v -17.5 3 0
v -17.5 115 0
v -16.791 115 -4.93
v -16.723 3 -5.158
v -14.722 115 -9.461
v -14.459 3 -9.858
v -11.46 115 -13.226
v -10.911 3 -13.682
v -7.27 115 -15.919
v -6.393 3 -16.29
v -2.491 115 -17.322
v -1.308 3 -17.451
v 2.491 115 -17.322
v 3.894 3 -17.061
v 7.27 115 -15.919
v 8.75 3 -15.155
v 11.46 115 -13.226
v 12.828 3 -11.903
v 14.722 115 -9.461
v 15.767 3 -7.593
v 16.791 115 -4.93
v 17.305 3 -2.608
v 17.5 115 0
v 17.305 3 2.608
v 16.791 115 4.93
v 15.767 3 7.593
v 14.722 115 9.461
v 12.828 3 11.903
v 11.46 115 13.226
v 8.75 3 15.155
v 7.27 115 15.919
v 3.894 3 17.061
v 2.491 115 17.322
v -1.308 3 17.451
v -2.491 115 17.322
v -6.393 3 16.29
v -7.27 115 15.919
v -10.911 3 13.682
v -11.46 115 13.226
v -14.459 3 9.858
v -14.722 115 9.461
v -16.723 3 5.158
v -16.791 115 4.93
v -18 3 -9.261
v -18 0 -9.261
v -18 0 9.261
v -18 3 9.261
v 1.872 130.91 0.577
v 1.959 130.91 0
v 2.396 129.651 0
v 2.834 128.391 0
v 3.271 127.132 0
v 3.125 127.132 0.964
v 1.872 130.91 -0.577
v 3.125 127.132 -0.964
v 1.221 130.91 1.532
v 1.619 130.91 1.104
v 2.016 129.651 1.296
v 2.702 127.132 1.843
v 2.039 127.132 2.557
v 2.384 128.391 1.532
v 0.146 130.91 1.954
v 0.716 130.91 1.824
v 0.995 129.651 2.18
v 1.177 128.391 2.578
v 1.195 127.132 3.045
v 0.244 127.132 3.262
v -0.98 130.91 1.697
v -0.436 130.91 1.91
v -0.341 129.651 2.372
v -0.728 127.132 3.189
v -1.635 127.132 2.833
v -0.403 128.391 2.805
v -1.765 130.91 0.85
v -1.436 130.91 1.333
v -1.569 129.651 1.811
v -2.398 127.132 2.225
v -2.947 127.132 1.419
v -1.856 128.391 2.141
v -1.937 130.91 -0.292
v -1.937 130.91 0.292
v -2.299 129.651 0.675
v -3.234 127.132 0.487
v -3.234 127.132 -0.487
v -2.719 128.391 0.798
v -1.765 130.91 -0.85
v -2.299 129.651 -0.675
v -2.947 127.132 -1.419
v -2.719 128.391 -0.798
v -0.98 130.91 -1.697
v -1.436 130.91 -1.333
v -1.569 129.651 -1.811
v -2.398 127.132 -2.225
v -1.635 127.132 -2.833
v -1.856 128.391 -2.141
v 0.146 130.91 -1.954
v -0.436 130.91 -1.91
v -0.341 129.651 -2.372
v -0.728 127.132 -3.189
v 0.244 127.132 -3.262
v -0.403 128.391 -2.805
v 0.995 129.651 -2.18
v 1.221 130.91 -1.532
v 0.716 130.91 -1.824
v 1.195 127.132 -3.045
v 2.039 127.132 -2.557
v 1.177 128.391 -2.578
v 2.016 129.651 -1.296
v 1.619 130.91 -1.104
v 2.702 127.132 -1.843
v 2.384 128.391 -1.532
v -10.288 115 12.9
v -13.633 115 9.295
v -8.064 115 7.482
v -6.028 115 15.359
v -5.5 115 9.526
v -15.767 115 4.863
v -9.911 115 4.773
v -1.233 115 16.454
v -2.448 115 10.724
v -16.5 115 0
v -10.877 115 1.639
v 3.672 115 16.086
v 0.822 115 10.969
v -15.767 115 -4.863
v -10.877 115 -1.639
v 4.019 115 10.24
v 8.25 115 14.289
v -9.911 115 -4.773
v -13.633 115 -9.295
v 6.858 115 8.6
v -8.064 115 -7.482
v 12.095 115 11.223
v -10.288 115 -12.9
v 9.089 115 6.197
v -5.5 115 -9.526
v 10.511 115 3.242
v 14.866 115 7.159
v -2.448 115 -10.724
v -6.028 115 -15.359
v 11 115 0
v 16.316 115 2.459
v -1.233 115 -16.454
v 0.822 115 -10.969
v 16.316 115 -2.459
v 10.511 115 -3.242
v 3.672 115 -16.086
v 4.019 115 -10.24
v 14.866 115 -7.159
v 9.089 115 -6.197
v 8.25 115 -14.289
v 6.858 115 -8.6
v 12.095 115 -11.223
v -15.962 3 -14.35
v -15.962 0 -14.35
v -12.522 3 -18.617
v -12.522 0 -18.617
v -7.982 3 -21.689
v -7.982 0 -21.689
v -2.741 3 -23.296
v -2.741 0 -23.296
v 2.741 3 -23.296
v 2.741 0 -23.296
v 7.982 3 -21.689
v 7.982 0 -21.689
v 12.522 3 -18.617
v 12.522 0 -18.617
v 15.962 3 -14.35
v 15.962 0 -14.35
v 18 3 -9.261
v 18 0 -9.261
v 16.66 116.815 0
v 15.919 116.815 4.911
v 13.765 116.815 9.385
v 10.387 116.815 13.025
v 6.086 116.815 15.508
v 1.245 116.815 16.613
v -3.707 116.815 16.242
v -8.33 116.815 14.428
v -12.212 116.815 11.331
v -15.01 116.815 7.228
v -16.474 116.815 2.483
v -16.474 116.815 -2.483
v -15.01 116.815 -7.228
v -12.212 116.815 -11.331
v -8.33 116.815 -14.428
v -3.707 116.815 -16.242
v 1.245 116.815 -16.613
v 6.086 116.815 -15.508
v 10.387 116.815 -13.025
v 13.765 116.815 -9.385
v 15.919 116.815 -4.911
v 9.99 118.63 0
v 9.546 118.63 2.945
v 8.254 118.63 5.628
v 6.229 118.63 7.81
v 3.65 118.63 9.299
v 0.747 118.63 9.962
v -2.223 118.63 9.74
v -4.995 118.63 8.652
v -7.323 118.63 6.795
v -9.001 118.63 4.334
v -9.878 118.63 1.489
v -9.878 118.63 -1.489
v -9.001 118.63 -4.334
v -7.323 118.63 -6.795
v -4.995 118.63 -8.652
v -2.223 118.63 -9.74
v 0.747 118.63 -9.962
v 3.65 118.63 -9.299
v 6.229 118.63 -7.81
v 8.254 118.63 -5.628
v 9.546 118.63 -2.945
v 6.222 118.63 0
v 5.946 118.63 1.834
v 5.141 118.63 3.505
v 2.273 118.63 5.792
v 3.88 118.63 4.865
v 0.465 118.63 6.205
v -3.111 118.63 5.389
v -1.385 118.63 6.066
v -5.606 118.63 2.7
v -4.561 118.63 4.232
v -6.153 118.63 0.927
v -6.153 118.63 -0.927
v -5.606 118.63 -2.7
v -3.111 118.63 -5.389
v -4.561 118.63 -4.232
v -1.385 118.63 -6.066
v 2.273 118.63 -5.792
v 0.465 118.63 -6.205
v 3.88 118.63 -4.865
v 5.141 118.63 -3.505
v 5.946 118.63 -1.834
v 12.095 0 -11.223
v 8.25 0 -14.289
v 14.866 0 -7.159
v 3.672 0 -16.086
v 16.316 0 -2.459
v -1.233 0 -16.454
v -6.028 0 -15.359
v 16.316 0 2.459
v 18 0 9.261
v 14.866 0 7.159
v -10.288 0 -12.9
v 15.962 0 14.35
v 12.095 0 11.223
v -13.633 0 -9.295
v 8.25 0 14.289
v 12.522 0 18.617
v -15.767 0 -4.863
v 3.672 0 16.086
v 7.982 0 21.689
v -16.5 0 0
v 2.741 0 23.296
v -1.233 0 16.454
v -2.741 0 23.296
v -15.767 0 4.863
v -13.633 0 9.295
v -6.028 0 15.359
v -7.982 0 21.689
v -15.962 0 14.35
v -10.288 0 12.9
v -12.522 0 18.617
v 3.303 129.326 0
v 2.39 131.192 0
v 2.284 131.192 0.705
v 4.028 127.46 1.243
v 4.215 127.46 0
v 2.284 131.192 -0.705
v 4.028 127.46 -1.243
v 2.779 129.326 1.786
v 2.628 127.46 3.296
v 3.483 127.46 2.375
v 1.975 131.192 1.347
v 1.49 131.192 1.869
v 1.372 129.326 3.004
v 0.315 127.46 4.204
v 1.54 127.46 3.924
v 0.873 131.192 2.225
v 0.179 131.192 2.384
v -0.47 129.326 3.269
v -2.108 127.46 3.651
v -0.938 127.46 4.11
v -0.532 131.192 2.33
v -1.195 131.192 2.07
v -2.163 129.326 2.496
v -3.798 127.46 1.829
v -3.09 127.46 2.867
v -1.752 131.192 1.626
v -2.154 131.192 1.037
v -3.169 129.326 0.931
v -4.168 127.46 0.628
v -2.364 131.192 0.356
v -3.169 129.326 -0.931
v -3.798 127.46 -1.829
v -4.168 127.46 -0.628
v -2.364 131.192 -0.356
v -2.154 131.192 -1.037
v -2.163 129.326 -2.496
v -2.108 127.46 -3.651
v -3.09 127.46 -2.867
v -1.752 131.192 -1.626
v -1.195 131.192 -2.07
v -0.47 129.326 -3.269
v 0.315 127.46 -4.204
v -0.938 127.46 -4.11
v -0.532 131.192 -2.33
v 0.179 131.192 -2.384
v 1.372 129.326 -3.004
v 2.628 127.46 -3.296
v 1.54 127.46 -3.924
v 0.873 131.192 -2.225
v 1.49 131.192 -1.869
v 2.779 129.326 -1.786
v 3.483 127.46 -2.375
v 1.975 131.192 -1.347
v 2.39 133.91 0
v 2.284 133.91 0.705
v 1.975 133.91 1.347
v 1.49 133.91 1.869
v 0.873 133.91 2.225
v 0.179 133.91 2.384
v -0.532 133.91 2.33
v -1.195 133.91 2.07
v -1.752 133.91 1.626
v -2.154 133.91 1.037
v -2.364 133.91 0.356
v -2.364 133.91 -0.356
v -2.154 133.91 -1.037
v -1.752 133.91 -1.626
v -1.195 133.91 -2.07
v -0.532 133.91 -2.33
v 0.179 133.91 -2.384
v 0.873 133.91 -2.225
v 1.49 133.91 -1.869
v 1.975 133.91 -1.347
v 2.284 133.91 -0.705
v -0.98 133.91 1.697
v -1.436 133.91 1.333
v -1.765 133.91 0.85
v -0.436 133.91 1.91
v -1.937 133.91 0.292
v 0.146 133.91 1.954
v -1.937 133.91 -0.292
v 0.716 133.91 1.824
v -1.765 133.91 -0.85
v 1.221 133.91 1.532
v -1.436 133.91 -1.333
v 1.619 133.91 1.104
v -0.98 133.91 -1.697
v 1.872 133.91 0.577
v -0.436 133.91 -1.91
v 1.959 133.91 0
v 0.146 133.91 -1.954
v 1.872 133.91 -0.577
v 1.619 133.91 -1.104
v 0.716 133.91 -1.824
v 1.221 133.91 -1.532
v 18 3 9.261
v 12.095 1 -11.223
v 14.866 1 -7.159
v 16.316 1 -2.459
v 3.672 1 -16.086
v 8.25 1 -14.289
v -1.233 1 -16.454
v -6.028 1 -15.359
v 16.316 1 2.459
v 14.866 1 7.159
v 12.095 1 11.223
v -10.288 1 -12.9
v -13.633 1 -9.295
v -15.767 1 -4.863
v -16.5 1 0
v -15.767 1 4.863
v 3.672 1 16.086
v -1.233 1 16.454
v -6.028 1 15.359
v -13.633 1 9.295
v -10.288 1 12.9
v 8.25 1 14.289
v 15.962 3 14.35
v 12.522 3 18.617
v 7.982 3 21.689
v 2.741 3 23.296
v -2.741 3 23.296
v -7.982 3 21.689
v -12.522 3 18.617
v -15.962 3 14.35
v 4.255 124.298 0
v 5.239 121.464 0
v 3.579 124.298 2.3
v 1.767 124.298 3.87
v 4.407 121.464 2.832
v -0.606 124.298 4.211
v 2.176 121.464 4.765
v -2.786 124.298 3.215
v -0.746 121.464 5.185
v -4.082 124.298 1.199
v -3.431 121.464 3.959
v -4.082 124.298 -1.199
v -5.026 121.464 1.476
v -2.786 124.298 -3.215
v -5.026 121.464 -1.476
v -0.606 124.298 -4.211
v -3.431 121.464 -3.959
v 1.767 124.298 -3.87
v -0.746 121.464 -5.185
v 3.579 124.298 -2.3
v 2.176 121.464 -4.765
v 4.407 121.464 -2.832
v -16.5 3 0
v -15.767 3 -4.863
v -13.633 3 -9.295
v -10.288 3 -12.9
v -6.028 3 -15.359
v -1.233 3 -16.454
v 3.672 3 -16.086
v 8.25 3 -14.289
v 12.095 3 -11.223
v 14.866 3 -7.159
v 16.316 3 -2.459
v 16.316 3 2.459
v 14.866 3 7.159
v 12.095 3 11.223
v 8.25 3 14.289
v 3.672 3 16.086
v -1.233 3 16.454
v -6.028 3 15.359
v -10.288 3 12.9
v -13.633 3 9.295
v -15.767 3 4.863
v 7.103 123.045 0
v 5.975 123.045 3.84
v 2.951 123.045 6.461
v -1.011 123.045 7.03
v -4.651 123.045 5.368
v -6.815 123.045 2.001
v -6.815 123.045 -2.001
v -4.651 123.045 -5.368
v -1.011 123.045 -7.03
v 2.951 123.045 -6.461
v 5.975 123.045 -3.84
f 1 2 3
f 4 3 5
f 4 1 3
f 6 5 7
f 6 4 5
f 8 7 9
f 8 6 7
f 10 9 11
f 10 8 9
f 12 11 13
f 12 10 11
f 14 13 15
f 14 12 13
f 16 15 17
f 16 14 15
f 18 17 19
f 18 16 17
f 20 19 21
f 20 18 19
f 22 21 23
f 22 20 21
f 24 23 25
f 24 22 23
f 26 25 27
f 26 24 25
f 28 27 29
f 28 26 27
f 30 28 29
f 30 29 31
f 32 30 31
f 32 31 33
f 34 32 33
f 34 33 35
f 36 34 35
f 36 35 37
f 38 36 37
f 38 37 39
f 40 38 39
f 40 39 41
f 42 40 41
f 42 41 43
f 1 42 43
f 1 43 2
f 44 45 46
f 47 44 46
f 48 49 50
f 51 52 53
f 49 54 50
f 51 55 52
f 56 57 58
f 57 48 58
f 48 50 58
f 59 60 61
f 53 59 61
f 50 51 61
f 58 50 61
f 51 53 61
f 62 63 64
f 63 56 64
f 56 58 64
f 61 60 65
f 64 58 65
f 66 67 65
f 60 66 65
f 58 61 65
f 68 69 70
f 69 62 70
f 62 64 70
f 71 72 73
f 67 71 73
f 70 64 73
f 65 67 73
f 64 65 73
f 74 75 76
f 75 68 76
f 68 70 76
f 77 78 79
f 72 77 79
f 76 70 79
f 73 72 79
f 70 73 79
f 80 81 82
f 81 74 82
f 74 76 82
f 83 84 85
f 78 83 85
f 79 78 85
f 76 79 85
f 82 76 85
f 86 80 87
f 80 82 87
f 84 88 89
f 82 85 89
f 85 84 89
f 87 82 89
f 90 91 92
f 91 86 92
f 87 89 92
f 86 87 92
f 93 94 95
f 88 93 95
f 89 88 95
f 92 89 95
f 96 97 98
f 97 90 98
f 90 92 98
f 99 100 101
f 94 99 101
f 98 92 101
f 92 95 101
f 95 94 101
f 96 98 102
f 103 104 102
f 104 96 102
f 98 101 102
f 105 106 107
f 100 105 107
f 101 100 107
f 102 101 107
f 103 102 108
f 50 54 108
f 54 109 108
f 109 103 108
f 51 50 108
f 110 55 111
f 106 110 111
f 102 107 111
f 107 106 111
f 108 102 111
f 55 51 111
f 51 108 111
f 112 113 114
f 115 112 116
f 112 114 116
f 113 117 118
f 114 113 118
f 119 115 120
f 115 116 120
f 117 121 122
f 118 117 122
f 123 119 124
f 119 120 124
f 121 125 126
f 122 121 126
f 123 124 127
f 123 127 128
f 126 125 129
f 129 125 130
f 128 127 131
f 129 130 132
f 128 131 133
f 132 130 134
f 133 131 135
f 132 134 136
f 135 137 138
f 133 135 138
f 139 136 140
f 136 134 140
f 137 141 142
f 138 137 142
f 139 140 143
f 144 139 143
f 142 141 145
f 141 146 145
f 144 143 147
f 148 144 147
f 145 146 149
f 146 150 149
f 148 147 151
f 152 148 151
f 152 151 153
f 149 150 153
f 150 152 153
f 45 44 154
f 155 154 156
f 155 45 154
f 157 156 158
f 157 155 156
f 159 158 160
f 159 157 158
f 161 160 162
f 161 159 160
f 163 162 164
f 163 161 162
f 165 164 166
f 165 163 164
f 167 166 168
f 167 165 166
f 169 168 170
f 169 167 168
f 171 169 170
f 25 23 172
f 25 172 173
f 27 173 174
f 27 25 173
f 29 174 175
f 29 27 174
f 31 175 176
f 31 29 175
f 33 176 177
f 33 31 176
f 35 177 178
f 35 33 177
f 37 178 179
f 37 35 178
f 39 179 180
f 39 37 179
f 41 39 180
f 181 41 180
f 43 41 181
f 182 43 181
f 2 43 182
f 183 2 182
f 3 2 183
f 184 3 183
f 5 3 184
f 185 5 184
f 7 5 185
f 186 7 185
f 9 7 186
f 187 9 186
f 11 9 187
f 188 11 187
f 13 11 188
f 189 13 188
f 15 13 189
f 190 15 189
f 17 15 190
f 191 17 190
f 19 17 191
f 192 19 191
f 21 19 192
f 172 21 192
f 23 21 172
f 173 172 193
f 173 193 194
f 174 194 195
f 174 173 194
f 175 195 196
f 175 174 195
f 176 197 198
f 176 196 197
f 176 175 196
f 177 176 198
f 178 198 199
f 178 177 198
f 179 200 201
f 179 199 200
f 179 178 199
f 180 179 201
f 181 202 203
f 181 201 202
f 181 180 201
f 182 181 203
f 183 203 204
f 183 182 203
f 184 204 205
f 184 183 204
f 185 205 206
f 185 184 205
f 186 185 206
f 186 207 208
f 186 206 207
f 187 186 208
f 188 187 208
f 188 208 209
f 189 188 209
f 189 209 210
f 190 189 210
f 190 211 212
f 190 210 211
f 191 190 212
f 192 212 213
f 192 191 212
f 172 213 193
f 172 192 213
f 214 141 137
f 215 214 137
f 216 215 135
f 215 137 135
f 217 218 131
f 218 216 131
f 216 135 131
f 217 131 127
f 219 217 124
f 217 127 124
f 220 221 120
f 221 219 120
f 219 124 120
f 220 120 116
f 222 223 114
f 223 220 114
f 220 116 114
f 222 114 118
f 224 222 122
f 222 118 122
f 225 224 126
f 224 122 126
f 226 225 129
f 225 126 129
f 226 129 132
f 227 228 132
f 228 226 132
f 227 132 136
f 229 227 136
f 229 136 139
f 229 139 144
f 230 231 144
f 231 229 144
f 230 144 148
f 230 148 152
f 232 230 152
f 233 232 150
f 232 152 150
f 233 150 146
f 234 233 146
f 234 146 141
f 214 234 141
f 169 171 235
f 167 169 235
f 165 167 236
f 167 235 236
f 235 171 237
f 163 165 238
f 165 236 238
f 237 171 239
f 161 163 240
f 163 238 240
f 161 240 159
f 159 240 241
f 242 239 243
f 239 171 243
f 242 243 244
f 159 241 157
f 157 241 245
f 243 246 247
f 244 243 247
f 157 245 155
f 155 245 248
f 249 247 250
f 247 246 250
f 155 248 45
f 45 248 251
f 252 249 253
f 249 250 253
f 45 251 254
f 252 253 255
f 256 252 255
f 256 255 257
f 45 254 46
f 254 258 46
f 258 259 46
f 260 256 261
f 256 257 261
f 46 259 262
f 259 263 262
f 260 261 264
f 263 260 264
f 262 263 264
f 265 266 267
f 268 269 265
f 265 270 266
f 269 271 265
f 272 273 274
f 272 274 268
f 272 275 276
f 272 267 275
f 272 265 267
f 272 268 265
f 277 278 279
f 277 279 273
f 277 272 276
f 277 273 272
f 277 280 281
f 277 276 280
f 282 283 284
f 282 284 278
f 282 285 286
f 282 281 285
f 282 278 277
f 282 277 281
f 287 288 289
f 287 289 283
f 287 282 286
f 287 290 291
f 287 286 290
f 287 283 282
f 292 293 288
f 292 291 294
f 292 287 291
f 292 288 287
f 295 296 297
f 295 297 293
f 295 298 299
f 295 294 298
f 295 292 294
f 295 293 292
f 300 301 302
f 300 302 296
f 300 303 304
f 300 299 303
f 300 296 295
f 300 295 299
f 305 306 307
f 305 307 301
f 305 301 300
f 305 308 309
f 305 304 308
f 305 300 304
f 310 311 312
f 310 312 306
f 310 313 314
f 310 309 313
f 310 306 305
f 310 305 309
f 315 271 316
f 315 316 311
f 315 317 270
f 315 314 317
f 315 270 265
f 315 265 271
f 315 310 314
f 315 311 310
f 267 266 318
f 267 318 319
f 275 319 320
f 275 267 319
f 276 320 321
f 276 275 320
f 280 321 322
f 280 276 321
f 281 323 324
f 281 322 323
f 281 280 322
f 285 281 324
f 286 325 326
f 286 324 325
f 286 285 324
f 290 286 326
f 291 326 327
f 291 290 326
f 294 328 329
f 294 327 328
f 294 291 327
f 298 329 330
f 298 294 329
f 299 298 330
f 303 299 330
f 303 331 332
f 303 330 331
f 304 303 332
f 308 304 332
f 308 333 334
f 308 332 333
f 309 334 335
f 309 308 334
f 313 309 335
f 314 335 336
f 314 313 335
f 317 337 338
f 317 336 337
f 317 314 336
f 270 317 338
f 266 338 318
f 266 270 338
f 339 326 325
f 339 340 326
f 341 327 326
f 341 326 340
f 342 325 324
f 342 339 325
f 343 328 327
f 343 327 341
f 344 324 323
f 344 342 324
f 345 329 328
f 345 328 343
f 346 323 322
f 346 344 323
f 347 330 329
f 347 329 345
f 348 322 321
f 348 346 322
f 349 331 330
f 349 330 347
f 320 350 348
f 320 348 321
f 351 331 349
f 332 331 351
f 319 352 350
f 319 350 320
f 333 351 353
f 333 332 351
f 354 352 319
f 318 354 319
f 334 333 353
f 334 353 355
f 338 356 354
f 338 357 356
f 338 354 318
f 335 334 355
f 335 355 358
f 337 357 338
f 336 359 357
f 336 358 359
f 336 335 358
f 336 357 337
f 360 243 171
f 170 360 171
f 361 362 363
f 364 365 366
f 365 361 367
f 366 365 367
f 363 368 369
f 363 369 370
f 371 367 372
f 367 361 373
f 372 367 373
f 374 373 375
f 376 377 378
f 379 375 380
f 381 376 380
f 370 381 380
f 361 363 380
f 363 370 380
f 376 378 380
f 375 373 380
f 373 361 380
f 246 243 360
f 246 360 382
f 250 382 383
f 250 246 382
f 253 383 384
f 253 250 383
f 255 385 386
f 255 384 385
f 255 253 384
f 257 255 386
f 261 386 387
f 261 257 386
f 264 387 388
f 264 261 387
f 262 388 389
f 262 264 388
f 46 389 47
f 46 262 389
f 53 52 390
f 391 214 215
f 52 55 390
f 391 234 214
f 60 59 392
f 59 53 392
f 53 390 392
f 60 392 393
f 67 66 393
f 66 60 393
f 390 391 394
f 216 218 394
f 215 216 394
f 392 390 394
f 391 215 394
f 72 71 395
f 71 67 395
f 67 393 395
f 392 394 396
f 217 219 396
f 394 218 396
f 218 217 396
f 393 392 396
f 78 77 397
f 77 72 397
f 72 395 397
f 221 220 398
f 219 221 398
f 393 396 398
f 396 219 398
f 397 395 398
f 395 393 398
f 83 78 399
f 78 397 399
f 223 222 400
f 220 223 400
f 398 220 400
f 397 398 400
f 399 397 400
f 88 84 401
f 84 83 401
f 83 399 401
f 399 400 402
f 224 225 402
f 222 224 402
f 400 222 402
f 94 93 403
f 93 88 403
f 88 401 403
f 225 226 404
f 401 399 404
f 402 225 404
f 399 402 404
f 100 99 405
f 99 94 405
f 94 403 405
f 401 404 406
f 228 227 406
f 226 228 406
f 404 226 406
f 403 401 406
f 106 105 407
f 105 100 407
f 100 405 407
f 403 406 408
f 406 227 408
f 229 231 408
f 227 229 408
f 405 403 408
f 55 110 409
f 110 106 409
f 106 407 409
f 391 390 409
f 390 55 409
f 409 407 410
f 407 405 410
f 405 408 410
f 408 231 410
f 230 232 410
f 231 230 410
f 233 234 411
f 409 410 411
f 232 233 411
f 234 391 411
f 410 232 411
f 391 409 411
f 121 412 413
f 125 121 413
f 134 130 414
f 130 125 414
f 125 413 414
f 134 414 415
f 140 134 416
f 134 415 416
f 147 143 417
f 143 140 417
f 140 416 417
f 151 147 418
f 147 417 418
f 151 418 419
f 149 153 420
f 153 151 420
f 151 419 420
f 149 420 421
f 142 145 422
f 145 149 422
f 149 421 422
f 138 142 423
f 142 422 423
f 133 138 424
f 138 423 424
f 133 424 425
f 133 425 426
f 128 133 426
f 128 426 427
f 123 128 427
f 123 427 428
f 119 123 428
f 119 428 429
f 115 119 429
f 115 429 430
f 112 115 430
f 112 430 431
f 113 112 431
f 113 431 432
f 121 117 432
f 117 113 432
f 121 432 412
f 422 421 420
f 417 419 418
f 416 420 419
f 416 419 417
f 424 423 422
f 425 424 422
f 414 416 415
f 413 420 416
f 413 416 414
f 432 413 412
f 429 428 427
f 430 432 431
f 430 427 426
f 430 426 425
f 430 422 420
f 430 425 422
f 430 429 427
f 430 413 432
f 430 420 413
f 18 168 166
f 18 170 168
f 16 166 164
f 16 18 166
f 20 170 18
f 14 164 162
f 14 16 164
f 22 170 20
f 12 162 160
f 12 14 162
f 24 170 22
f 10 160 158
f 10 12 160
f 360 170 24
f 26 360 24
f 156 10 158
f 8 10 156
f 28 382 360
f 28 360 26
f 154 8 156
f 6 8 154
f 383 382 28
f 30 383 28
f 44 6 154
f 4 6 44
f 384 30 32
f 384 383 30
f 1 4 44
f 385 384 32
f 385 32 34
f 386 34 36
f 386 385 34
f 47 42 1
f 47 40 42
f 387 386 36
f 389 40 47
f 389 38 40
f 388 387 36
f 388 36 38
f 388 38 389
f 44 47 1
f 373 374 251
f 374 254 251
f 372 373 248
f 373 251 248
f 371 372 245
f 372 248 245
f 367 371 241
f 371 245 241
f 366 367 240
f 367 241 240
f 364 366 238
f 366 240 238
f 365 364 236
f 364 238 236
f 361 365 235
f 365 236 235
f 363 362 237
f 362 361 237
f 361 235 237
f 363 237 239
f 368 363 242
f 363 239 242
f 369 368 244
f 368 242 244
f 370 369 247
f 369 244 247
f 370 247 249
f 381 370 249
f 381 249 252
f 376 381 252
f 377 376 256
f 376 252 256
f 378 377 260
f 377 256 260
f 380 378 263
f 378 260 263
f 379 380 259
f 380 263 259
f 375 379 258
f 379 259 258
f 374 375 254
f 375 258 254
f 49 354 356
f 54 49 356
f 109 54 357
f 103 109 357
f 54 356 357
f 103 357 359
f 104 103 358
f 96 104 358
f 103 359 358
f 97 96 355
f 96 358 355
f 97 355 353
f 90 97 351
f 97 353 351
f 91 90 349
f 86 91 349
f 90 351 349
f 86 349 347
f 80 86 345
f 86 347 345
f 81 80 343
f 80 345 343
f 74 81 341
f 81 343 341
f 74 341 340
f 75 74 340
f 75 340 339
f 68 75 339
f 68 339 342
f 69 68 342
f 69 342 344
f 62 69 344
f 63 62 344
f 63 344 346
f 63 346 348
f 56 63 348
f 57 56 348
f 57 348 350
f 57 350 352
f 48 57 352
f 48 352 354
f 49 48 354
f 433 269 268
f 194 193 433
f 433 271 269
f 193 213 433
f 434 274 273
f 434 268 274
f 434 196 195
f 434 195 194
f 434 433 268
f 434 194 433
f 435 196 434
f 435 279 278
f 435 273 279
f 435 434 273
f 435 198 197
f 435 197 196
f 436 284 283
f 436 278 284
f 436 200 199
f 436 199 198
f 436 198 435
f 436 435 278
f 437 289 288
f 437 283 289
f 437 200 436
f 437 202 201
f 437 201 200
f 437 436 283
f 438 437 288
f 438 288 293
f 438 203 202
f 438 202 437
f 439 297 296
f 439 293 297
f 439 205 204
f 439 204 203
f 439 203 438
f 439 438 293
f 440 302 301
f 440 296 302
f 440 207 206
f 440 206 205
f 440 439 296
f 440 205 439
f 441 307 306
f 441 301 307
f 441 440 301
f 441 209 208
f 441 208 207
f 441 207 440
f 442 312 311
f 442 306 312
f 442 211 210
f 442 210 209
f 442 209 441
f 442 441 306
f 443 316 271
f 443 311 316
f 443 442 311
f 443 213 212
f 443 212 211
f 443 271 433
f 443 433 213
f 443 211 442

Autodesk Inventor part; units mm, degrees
ref_plane "YZ Plane" through (0, 0, 0) normal (1, 0, 0) x (0, 1, 0)
ref_plane "XZ Plane" through (0, 0, 0) normal (0, 1, 0) x (-1, 0, 0)
ref_plane "XY Plane" through (0, 0, 0) normal (0, 0, 1) x (1, 0, 0)
sketch "Sketch1" plane through (0, 0, 0) normal (0, 1, 0) x (-1, 0, 0)
  circle A0 centre (0, 0) radius 16.5
  line L0 (0, -23.5) -> (18, -23.5)
  line L1 (18, -9.261) -> (18, 9.261)
  line L2 (-18, 9.261) -> (-18, -9.261)
  line L3 (-18, -23.5) -> (18, 23.5) construction
  line L4 (18, -23.5) -> (-18, 23.5) construction
  arc A1 (18, 9.261) -> (-18, 9.261) centre (0, 5.0033) ccw
  line L5 (28.3506, 0) -> (-36.241, 0) construction
  arc A2 (-18, -9.261) -> (18, -9.261) centre (0, -5.0033) ccw
  circle A3 centre (0, 0) radius 17.5
  dimension "d0" = 33
  dimension "d1" = 36
  dimension "d2" = 47
  dimension "d3" = 1
extrude "Extrusion1" add sketch "Sketch1" along normal blind 115 contours A3
extrude "Extrusion2" add sketch "Sketch1" along normal blind 3
sketch "Sketch2" plane through (0, 0, 0) normal (0, 0, 1) x (1, 0, 0)
  line L0 (16.5, 3) -> (16.5, 115) projected
  line L1 (16.5, 115) -> (11, 115)
  line L2 (17.5, 115) -> (-17.5, 115) projected
  line L3 (11, 115) -> (6.2224, 118.6297)
  line L4 (6.2224, 118.6297) -> (3.2708, 127.1319)
  line L5 (3.2708, 127.1319) -> (4.2154, 127.4599)
  line L6 (4.2154, 127.4599) -> (9.99, 118.6297)
  line L7 (17.5, 115) -> (16.6596, 116.8149)
  line L8 (16.6596, 116.8149) -> (9.99, 118.6297)
  line L9 (3.2708, 127.1319) -> (1.9591, 130.9102)
  line L10 (1.9591, 130.9102) -> (2.3904, 131.1923)
  line L11 (2.3904, 131.1923) -> (4.2154, 127.4599)
  line L12 (1.9591, 130.9102) -> (1.9591, 133.9102)
  line L13 (1.9591, 133.9102) -> (2.3904, 133.9102)
  line L14 (2.3904, 133.9102) -> (2.3904, 131.1923)
  line L15 (0, -26.782) -> (0, 160.6923) projected
  point P0 (0, 0)
  dimension "d8" = 5.5
  dimension "d9" = 6
  dimension "d10" = 9
  dimension "d11" = 1
  dimension "d12" = 2
  dimension "d13" = 3
revolve "Revolution1" add sketch "Sketch2" angle 360 about axis through (0, -10, 0) along (0, 1, 0)
extrude "Extrusion3" cut sketch "Sketch1" along normal blind 1 contours A0
properties part number "Larger Syringe"
